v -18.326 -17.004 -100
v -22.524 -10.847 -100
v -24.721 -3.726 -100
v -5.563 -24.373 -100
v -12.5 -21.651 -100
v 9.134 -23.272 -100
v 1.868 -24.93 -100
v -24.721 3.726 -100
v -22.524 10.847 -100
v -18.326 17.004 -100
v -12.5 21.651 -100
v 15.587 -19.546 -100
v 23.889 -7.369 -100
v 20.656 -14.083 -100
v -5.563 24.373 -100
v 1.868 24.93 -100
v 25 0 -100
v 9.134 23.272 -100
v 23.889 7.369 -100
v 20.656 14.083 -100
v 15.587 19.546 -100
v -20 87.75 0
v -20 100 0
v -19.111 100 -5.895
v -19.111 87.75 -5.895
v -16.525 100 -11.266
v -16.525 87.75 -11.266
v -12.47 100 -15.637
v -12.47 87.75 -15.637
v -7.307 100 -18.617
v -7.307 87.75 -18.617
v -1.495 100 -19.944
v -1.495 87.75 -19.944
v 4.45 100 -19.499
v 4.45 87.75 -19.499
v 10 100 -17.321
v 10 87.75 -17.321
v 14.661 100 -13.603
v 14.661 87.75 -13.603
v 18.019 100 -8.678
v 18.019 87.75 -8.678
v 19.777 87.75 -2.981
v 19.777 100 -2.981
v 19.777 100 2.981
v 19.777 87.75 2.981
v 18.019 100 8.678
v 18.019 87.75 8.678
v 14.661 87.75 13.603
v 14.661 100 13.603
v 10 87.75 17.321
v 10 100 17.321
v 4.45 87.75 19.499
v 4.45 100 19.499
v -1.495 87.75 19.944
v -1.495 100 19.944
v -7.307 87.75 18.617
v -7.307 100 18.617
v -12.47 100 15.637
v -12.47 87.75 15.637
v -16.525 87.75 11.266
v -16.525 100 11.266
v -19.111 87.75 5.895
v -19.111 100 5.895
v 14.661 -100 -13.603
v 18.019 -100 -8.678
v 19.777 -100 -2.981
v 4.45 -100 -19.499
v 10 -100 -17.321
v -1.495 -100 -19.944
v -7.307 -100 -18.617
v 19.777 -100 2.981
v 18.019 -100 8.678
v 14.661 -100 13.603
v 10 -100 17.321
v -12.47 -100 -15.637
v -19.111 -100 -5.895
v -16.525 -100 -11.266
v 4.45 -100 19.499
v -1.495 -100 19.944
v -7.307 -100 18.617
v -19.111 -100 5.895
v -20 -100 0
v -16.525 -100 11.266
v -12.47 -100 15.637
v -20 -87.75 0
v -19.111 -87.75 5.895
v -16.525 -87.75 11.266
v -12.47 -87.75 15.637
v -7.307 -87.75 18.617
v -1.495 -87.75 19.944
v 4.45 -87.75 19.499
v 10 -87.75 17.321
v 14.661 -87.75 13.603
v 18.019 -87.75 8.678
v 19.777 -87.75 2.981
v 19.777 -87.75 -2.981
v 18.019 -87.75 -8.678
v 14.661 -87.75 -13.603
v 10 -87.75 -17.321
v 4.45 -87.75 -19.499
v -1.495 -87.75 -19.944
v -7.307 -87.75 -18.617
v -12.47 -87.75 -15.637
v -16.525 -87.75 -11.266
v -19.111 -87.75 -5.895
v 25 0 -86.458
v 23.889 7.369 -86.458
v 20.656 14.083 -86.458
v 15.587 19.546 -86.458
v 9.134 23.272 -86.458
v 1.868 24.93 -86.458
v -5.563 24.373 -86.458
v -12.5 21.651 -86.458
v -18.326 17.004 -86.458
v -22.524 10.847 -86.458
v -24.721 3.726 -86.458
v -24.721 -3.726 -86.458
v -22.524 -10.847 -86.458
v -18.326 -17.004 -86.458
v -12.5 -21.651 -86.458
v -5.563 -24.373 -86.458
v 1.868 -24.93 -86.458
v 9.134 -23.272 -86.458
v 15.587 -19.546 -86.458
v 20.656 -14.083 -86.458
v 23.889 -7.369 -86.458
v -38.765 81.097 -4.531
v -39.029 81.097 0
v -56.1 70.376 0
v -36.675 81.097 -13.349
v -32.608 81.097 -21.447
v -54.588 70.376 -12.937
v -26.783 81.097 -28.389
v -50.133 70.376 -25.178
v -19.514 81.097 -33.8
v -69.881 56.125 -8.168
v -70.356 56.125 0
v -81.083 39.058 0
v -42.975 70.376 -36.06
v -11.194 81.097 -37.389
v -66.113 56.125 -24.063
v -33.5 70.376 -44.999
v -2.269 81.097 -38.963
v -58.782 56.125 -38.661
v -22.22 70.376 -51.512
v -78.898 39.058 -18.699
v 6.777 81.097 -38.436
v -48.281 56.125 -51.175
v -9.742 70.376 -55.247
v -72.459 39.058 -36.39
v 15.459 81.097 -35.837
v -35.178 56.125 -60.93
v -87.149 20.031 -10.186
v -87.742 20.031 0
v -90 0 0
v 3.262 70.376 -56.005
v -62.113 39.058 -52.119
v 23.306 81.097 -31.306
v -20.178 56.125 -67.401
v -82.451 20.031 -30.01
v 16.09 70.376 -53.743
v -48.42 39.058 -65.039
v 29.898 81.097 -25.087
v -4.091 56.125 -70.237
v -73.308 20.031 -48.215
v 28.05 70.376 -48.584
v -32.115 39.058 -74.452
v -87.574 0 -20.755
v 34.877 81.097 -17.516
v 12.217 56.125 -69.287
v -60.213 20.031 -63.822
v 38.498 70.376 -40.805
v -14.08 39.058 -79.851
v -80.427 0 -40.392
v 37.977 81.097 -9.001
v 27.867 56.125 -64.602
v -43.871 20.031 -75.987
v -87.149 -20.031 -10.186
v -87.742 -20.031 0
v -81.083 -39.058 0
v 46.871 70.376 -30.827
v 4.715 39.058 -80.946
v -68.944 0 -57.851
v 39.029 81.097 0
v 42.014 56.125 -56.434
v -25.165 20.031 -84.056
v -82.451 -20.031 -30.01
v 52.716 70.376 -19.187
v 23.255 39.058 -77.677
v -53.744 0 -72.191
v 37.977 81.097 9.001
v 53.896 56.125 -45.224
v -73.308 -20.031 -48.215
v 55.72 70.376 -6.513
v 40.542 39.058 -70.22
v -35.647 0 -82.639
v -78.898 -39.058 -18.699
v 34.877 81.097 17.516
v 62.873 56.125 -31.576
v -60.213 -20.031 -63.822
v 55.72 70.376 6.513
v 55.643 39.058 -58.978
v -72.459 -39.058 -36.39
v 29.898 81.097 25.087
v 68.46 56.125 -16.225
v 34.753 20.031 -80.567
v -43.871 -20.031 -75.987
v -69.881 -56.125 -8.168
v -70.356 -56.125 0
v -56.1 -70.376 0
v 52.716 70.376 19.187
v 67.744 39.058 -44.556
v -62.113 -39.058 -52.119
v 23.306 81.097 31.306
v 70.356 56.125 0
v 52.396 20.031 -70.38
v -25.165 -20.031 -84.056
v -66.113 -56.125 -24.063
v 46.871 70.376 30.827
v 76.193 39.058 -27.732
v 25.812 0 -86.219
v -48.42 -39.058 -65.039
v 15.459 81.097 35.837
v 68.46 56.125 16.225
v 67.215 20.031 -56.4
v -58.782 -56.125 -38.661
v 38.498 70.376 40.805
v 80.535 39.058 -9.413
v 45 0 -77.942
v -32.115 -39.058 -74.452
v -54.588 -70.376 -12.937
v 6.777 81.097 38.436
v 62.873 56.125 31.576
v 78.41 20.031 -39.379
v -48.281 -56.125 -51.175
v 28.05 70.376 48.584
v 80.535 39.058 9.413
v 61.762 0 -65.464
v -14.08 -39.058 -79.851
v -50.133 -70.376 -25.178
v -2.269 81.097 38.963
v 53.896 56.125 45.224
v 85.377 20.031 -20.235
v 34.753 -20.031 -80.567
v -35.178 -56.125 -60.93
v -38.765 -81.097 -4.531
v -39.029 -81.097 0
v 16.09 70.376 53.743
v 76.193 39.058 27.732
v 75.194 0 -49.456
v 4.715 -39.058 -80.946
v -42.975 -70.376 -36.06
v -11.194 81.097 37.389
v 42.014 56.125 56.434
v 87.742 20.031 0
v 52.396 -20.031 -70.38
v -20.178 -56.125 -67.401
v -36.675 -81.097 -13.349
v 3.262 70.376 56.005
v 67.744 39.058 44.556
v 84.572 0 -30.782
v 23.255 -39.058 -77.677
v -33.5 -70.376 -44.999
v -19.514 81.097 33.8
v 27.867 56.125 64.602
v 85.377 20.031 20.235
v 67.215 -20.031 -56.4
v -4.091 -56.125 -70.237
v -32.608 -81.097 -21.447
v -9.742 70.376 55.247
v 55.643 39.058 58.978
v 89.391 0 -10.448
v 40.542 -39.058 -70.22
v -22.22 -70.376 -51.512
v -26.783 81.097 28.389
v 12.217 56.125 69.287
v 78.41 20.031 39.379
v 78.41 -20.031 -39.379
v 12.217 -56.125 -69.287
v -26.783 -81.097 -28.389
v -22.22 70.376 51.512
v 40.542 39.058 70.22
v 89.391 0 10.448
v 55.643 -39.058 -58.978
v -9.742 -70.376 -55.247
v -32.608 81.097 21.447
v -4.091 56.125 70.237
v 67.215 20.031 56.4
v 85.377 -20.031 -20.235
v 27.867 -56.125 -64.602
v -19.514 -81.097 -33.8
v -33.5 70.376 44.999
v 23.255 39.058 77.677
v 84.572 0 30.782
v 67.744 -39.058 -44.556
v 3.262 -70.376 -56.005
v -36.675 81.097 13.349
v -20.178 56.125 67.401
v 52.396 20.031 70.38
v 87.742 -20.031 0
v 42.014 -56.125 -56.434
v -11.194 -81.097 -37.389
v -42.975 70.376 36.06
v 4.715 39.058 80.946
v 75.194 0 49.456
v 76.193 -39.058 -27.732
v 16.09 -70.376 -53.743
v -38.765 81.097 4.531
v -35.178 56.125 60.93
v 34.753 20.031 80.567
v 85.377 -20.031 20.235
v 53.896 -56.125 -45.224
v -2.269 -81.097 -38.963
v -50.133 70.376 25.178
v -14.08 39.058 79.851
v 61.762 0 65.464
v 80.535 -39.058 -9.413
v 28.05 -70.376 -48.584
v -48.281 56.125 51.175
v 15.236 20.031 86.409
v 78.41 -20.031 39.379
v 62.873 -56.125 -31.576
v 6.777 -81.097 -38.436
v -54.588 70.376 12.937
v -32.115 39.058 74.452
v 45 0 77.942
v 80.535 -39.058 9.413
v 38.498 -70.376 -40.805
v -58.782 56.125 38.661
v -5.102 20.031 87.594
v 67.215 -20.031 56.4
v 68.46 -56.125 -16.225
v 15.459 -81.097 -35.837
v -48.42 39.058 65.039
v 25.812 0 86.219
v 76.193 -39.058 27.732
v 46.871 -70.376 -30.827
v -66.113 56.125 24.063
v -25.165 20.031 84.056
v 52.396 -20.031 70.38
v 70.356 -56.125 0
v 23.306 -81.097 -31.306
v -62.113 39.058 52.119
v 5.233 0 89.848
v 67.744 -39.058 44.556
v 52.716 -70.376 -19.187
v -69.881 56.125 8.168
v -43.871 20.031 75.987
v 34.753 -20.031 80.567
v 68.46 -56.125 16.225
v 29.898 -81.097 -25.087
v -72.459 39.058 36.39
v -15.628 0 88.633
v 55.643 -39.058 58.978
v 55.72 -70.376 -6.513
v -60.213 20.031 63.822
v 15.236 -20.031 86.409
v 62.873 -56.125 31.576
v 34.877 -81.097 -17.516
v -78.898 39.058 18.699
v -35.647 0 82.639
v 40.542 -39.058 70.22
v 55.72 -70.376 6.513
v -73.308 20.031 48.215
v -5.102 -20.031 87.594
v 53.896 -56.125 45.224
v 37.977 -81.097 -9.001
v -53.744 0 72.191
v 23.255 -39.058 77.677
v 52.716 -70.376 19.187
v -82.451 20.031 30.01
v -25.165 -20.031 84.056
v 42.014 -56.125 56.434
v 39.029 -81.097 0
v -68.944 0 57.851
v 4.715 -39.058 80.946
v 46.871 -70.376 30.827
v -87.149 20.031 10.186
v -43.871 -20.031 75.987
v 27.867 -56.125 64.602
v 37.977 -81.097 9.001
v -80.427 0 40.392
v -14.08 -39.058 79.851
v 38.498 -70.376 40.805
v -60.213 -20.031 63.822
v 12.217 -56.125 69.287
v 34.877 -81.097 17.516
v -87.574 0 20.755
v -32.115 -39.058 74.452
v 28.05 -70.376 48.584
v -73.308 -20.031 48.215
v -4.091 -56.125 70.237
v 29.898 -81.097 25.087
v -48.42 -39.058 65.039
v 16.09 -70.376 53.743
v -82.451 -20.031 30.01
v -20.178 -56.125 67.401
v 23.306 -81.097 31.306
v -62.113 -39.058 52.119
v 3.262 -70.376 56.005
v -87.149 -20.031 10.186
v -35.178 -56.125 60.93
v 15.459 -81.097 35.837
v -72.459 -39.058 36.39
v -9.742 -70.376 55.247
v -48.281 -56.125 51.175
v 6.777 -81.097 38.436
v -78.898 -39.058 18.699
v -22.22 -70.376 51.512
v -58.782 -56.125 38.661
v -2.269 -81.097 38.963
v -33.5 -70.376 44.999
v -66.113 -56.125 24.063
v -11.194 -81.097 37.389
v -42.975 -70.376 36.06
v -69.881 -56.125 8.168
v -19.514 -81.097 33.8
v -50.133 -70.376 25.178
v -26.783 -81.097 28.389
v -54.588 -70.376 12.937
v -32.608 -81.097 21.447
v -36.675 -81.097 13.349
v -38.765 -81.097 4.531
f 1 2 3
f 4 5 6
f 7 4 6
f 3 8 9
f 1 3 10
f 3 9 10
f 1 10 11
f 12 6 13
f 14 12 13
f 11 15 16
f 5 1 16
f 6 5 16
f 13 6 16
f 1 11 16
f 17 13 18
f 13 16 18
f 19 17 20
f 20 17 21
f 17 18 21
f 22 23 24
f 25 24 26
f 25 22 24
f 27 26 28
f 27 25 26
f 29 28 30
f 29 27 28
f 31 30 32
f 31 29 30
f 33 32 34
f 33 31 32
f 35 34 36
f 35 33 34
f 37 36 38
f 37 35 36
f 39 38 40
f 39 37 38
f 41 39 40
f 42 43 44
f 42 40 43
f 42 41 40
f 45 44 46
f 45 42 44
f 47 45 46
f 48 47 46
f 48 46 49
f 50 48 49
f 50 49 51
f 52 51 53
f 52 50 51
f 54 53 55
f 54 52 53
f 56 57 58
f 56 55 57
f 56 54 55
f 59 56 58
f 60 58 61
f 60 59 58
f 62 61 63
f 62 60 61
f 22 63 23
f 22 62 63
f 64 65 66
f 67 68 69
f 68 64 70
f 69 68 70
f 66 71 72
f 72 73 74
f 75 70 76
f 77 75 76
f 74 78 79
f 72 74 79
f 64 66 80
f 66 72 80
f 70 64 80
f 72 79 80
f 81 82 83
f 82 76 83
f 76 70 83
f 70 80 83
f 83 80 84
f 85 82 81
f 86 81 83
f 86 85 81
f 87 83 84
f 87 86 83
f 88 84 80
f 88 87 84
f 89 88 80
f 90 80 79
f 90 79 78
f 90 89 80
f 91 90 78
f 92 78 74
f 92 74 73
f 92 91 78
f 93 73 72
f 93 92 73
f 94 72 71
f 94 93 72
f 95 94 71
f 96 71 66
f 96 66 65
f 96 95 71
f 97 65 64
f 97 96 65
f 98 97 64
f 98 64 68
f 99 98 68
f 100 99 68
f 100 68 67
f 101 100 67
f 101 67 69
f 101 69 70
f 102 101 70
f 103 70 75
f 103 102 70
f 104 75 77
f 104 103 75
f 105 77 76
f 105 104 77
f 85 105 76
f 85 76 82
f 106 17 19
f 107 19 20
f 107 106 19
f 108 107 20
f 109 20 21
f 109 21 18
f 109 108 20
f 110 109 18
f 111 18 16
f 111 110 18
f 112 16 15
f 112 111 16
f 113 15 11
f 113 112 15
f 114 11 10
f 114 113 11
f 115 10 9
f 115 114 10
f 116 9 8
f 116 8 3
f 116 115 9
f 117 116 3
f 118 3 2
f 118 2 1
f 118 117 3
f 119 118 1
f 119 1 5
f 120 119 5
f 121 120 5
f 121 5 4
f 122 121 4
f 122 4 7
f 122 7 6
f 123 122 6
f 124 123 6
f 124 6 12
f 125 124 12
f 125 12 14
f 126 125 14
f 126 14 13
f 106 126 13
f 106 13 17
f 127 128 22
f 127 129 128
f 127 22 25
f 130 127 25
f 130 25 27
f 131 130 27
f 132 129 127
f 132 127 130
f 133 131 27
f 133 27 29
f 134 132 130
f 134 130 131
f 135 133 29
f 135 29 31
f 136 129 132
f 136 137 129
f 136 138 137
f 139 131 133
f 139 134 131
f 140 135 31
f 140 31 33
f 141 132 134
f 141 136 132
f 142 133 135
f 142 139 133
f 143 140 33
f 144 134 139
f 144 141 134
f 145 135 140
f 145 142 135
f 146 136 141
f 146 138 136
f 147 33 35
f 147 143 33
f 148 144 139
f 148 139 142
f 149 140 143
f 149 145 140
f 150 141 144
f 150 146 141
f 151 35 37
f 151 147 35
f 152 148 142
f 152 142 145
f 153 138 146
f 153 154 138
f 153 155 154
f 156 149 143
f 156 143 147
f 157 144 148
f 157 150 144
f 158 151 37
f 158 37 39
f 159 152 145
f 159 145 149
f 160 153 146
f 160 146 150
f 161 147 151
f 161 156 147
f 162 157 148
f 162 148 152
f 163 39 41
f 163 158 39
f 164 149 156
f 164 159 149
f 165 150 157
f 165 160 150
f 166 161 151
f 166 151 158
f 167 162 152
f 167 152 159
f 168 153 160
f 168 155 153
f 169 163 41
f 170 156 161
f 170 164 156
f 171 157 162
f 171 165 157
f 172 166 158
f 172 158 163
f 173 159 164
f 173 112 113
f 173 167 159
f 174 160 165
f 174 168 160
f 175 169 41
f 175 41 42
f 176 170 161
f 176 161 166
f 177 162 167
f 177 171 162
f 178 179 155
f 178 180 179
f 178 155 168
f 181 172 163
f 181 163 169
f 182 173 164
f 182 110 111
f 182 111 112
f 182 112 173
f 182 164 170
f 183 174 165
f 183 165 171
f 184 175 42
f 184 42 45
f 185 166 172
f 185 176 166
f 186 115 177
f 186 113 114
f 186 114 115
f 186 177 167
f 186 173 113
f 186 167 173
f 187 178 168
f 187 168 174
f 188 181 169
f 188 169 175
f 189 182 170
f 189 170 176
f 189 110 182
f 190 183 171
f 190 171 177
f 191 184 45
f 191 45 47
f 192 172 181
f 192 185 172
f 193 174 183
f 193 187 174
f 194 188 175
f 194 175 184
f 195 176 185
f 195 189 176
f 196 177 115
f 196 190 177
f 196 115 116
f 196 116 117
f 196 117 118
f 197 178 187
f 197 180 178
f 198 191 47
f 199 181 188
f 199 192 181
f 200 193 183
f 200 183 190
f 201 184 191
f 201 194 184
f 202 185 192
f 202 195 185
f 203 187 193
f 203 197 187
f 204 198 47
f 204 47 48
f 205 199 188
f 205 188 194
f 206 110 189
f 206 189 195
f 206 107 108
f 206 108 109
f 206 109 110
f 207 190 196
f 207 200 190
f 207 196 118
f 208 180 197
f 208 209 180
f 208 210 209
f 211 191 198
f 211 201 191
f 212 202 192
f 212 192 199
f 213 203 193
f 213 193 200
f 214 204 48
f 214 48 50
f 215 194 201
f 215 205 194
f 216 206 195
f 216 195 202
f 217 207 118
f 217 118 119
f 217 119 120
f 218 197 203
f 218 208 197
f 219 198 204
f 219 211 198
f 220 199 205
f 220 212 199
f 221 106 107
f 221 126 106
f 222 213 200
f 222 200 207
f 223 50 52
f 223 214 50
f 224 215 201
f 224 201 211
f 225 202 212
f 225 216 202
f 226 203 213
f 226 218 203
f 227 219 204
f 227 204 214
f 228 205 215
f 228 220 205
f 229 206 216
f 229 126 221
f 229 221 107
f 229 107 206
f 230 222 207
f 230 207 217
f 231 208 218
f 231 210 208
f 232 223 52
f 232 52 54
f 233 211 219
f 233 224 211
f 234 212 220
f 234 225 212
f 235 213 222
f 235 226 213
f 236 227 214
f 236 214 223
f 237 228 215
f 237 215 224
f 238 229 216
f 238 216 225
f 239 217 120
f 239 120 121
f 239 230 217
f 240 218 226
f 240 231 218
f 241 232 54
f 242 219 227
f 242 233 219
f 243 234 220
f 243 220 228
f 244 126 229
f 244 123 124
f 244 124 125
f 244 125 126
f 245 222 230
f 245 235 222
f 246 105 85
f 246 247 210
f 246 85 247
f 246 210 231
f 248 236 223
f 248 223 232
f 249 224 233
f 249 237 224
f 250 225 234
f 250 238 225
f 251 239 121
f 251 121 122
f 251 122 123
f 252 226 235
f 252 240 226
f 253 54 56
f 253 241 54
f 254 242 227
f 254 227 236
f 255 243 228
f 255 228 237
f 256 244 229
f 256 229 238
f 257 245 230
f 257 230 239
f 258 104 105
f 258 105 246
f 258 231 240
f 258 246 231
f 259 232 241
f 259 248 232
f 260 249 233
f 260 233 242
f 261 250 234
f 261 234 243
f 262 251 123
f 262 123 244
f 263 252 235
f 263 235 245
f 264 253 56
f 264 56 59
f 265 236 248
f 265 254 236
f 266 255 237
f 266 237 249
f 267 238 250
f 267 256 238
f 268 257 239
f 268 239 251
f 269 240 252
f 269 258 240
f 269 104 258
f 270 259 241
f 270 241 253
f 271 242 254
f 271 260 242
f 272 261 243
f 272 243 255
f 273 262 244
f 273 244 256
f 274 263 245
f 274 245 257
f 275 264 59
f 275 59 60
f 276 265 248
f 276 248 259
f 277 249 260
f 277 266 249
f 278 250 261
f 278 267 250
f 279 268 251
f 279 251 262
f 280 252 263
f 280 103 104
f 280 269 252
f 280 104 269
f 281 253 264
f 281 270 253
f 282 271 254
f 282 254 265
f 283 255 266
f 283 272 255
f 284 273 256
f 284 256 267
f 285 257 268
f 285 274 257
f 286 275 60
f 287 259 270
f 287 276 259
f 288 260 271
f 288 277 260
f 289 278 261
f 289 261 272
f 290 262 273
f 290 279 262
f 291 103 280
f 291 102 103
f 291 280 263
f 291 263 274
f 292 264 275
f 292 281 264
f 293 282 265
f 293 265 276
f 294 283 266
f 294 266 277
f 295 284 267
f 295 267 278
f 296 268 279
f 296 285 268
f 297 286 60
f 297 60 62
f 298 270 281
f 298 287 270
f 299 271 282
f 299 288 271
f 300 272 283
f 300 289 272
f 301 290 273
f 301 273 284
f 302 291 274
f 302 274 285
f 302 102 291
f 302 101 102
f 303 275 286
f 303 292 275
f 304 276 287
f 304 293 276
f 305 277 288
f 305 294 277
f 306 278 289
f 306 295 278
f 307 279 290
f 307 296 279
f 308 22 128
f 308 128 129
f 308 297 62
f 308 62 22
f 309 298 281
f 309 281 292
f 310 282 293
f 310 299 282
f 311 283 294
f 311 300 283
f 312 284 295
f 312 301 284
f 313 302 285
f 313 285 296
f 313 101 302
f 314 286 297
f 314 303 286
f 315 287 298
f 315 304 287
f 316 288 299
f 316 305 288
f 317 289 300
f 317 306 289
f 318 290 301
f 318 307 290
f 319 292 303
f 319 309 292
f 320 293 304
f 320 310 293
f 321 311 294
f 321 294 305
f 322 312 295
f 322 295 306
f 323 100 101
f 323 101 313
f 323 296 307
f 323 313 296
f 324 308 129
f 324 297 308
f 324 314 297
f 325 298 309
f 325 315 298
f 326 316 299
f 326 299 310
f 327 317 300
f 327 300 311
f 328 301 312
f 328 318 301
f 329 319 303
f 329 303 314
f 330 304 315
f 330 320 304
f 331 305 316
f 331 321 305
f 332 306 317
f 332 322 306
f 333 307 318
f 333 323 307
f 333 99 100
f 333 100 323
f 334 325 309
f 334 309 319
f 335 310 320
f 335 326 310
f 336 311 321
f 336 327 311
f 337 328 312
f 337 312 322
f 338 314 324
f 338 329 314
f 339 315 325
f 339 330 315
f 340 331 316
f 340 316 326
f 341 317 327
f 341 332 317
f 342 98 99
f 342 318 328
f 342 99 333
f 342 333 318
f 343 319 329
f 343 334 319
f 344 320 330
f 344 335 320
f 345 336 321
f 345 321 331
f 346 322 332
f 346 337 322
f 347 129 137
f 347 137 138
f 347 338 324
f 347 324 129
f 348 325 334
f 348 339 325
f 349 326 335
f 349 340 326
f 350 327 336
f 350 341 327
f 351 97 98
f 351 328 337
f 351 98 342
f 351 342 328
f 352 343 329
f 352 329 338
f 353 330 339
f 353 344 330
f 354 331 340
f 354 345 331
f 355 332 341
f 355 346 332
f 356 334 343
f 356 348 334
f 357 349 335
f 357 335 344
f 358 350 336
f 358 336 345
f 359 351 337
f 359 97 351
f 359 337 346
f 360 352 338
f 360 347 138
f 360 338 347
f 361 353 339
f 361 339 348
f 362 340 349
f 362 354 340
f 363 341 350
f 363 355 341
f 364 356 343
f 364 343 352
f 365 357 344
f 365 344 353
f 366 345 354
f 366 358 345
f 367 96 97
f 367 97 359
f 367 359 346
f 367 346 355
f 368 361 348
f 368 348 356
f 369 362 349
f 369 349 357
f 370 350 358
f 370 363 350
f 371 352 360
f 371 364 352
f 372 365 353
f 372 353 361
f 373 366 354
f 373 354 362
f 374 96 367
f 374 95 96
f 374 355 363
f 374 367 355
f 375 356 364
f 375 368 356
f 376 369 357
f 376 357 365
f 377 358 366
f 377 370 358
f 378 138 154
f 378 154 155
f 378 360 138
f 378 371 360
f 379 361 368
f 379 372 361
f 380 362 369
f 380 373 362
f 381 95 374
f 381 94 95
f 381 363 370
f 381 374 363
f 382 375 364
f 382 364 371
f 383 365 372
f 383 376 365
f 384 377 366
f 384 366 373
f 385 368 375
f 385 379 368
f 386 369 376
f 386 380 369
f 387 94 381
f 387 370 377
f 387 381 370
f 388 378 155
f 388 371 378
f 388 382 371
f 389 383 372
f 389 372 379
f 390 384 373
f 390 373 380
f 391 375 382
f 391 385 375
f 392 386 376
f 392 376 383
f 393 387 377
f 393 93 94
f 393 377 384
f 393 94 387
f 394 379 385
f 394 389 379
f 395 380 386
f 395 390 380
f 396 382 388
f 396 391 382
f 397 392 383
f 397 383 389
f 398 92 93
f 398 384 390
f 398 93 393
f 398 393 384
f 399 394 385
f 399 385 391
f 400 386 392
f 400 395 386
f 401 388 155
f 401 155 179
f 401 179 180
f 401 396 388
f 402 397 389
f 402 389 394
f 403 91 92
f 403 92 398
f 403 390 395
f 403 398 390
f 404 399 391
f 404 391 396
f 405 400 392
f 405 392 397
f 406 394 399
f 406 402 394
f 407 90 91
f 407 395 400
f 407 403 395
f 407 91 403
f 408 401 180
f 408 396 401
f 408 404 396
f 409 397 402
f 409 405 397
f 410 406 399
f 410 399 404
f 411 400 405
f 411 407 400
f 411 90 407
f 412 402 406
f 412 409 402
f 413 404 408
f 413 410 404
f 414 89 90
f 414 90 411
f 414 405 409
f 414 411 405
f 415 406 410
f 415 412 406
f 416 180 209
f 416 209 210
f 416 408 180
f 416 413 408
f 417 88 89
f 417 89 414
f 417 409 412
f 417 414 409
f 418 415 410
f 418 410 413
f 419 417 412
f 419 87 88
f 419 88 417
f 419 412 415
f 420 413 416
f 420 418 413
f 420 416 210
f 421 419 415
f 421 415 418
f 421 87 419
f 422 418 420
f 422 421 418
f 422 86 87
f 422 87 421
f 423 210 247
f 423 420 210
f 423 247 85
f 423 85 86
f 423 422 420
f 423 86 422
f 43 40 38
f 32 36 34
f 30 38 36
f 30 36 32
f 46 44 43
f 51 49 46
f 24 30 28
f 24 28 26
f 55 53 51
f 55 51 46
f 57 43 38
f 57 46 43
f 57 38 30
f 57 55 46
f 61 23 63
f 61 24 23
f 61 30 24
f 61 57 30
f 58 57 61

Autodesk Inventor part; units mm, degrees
ref_plane "YZ Plane" through (0, 0, 0) normal (1, 0, 0) x (0, 1, 0)
sketch "スケッチ1" plane through (0, 0, 0) normal (0, 0, 1) x (1, 0, 0)
  arc A0 (0, 90) -> (0, -90) centre (0, 0) ccw
  line L0 (0, 90) -> (0, -90)
  dimension "d0" = 180
revolve "回転1" add sketch "スケッチ1" angle 360 about axis through (0, 90, 0) along (0, -1, 0)
sketch "スケッチ2" plane through (0, 0, 0) normal (0, 1, 0) x (-1, 0, 0)
  circle A0 centre (0, 0) radius 20
  dimension "d2" = 40
extrude "押し出し1" add sketch "スケッチ2" along normal mid plane 200
sketch "スケッチ3" plane through (0, 0, 0) normal (0, 0, 1) x (1, 0, 0)
  circle A0 centre (0, 0) radius 25
  dimension "d5" = 50
extrude "押し出し2" add sketch "スケッチ3" against normal blind 100
properties part number "HeadY"
